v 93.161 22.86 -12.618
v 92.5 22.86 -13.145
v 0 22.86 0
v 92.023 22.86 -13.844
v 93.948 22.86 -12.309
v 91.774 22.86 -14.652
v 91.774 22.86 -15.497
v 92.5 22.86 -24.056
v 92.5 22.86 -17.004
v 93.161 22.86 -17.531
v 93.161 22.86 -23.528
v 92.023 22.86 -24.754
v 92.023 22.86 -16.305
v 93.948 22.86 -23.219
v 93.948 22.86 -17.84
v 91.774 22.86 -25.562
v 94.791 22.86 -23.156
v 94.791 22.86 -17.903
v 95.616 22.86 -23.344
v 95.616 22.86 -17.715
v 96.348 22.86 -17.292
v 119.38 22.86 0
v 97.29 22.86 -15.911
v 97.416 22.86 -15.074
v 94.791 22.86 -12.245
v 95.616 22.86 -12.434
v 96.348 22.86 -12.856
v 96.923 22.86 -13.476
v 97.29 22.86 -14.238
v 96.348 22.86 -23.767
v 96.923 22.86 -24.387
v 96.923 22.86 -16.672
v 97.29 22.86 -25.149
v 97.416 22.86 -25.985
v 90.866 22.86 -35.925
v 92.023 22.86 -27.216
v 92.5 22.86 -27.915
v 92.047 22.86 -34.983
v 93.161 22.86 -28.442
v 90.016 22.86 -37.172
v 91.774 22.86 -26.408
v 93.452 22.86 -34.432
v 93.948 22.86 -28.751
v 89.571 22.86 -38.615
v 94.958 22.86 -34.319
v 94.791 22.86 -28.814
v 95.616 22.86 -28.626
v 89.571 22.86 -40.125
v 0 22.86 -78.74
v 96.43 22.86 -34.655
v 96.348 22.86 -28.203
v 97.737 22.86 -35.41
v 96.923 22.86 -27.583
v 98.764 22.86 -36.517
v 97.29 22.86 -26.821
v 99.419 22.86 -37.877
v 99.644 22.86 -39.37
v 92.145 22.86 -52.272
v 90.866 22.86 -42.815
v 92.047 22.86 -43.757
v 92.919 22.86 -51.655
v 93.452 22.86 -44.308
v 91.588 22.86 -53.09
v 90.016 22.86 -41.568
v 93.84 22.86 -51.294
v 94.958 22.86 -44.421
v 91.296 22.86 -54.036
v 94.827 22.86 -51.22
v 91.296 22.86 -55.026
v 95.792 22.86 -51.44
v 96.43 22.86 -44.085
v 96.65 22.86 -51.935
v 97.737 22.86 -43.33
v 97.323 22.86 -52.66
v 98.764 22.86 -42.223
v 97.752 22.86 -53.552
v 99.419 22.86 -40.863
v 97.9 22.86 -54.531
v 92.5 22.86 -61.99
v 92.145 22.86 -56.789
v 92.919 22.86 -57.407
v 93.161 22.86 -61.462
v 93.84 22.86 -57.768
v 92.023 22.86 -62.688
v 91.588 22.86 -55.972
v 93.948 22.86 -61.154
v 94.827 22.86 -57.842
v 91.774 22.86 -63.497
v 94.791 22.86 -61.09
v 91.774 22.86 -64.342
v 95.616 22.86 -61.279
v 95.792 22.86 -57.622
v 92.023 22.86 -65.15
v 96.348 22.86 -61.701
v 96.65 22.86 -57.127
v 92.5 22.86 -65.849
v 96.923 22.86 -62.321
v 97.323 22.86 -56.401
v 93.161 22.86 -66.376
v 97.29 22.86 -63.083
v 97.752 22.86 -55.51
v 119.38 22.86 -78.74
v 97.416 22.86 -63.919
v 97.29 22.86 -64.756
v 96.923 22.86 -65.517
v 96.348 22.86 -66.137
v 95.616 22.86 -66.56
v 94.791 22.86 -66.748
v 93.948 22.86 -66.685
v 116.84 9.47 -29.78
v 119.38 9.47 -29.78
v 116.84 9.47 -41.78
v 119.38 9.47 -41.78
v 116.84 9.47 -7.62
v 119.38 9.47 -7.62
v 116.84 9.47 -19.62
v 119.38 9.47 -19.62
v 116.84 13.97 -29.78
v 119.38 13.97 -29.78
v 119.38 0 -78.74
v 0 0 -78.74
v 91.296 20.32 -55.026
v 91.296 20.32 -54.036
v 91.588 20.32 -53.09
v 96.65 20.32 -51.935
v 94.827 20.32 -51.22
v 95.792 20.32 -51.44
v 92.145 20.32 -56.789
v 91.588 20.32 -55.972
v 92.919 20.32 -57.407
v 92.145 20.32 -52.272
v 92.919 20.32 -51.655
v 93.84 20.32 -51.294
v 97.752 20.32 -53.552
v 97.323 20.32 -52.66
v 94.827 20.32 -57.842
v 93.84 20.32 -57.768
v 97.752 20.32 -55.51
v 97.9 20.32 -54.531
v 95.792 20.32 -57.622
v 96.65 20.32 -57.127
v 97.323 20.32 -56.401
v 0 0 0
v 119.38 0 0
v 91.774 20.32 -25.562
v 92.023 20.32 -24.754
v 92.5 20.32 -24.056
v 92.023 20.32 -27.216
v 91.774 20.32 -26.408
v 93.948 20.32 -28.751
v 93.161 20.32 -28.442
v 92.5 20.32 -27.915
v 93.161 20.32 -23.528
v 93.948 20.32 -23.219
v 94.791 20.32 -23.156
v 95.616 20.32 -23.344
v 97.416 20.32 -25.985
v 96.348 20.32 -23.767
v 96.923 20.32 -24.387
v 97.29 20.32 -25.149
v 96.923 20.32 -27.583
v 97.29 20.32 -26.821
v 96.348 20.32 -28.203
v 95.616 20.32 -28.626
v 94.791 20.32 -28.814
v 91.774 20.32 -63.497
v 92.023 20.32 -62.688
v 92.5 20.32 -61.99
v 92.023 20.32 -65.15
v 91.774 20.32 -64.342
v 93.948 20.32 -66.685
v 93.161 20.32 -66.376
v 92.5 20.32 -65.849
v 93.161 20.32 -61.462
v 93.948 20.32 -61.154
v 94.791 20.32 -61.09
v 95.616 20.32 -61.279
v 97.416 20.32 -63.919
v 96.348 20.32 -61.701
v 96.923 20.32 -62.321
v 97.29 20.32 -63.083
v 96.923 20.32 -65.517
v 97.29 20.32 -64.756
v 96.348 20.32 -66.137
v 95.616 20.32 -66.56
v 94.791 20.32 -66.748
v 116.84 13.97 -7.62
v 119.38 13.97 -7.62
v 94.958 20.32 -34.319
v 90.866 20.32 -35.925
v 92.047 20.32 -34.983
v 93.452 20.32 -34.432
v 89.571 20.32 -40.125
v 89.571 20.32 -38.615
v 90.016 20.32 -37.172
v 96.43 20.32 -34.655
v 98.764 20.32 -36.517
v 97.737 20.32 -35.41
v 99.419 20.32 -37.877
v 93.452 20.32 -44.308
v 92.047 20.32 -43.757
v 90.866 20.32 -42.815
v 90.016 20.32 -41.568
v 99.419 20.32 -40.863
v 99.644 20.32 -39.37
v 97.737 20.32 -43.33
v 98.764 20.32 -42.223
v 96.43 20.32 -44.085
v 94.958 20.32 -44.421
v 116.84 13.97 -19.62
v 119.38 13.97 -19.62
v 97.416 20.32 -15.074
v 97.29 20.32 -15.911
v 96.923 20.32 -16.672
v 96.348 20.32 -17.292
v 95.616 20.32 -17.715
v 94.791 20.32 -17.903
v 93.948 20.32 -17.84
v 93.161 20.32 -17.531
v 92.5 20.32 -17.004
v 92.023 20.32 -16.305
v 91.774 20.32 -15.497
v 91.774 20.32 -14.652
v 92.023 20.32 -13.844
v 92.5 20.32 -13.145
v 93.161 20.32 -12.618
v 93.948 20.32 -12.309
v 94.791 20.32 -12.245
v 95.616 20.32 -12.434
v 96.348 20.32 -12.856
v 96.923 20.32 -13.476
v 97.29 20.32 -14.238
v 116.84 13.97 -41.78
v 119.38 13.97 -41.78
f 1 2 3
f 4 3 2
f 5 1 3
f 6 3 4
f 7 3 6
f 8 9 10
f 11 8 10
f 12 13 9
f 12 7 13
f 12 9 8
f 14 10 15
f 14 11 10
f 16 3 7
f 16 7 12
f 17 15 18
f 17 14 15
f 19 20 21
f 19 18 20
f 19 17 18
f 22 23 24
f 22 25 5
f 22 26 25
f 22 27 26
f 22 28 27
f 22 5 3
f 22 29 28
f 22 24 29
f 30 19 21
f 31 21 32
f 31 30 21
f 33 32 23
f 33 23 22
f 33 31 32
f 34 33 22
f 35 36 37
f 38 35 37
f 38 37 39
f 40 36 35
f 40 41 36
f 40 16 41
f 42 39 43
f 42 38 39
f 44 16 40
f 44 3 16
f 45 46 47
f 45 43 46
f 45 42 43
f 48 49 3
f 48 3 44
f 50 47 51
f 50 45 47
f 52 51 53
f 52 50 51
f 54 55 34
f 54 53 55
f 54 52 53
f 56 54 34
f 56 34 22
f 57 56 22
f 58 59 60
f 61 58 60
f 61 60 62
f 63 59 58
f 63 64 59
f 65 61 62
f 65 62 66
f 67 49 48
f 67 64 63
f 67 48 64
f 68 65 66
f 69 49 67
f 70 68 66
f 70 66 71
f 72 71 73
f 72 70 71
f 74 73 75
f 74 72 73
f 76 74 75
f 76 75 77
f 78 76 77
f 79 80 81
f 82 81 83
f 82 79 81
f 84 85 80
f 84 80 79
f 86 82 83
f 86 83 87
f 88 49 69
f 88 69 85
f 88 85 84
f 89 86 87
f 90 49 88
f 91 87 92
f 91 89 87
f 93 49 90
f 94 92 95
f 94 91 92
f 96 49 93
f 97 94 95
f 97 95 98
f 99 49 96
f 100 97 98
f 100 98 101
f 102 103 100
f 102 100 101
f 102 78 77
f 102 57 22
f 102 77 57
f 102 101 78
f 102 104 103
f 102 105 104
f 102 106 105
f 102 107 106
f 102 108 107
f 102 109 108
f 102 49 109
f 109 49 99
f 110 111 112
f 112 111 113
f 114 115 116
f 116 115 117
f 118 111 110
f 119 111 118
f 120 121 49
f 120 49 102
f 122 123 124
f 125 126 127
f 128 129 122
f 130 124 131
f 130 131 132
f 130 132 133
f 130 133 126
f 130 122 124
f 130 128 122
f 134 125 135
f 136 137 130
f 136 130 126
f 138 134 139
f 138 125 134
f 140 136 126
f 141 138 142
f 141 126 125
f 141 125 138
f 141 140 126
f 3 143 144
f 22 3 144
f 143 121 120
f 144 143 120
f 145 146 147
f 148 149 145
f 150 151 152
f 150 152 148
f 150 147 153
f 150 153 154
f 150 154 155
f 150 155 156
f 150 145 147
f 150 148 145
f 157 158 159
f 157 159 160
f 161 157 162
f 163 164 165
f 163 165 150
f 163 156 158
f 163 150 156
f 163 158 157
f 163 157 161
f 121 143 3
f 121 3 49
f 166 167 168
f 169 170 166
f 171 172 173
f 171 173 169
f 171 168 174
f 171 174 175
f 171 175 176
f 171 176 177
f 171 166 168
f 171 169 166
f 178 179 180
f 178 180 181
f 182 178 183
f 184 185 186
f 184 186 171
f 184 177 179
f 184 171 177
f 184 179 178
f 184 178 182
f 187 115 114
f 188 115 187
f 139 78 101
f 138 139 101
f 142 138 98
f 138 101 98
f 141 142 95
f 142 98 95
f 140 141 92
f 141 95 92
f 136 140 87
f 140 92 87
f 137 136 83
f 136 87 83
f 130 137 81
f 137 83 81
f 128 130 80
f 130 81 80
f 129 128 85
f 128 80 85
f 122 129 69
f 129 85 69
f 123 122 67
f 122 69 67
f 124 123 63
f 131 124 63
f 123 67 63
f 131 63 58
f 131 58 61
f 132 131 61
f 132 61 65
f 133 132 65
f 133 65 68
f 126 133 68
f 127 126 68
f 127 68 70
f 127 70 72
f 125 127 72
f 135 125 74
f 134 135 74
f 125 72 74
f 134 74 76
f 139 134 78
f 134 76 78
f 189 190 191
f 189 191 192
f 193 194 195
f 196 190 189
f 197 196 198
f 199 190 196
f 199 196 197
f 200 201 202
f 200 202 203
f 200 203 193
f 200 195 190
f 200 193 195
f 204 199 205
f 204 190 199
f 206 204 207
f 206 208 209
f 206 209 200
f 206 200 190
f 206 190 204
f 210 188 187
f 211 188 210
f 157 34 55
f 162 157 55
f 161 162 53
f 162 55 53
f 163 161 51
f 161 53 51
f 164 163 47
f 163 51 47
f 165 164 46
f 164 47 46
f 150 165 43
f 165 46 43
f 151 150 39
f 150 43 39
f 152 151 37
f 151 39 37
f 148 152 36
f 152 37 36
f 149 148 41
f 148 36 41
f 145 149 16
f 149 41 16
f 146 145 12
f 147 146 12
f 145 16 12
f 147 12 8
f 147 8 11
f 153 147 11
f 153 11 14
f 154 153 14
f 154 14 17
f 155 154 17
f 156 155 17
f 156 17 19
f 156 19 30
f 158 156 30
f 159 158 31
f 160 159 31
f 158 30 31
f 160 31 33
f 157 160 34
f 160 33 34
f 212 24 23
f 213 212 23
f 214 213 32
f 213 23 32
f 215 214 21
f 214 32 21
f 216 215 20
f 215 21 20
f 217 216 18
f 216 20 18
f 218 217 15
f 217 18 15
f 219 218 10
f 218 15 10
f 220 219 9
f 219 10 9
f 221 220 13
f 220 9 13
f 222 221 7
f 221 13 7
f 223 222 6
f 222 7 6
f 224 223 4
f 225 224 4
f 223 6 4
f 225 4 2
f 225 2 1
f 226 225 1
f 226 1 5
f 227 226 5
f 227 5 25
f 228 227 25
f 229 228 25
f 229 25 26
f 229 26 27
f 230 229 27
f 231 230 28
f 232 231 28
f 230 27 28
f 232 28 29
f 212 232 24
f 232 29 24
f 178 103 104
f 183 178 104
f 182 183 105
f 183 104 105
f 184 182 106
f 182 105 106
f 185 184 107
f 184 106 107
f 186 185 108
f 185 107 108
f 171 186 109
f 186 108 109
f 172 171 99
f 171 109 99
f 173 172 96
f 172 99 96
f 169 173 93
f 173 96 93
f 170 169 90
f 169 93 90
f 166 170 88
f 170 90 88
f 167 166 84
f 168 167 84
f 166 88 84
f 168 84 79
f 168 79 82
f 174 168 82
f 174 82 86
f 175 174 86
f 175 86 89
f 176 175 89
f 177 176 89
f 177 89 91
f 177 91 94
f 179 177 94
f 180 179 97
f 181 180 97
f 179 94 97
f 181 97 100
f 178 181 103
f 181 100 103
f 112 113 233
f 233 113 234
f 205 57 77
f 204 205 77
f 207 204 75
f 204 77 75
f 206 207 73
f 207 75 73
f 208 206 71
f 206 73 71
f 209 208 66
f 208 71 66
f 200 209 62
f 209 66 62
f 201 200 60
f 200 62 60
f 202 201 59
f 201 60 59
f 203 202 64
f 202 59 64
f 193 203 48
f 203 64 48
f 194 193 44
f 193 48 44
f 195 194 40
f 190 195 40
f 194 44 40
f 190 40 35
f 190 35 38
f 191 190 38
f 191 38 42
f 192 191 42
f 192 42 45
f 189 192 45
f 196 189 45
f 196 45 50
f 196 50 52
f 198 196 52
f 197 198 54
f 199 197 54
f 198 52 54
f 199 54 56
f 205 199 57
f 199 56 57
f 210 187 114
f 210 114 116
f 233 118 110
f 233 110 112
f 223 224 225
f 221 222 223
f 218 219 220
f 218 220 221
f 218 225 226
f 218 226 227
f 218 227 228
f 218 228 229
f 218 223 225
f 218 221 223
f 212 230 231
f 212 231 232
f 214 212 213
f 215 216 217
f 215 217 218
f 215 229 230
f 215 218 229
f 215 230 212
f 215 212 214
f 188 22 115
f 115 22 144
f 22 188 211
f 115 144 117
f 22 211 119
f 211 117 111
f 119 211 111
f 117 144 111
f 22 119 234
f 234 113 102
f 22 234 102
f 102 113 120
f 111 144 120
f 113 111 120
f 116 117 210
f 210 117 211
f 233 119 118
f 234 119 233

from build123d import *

# Parameters (mm, degrees)
SKETCH1_W           = 119.38
SKETCH1_H           = 78.74
BOSS_EXTRUDE1_DEPTH = 22.86
SKETCH2_W           = 12
SKETCH2_H           = 4.5
CUT_EXTRUDE1_DEPTH  = 2.54
SKETCH3_R           = 5.06527112
SKETCH3_R_2         = 3.320502589
SKETCH3_R_3         = 2.836896815
CUT_EXTRUDE2_DEPTH  = 2.54


with BuildPart() as part:
    # Sketch1 → Boss-Extrude1 (new body)
    with BuildSketch(Plane(origin=(0, 0, 0), x_dir=(1, 0, 0), z_dir=(0, 1, 0))):
        with Locations((59.69, 39.37)):
            Rectangle(SKETCH1_W, SKETCH1_H)
    extrude(amount=BOSS_EXTRUDE1_DEPTH)

    # Sketch2 → Cut-Extrude1 (cut)
    with BuildSketch(Plane(origin=(119.38, 0, 0), x_dir=(0, 0, -1), z_dir=(1, 0, 0))):
        with Locations((35.78, 11.72)):
            Rectangle(SKETCH2_W, SKETCH2_H)
        with Locations((13.62, 11.72)):
            Rectangle(SKETCH2_W, SKETCH2_H)
    extrude(amount=-CUT_EXTRUDE1_DEPTH, mode=Mode.SUBTRACT)

    # Sketch3 → Cut-Extrude2 (cut)
    with BuildSketch(Plane(origin=(0, 22.86, 0), x_dir=(1, 0, 0), z_dir=(0, 1, 0))):
        with Locations((94.579217674, 39.37)):
            Circle(SKETCH3_R)
        with Locations((94.579217674, 54.530950953)):
            Circle(SKETCH3_R_2)
        with Locations((94.579217674, 63.919322254)):
            Circle(SKETCH3_R_3)
        with Locations((94.579217674, 25.985227401)):
            Circle(SKETCH3_R_3)
        with Locations((94.579217674, 15.074417511)):
            Circle(SKETCH3_R_3)
    extrude(amount=-CUT_EXTRUDE2_DEPTH, mode=Mode.SUBTRACT)


solid = part.part
